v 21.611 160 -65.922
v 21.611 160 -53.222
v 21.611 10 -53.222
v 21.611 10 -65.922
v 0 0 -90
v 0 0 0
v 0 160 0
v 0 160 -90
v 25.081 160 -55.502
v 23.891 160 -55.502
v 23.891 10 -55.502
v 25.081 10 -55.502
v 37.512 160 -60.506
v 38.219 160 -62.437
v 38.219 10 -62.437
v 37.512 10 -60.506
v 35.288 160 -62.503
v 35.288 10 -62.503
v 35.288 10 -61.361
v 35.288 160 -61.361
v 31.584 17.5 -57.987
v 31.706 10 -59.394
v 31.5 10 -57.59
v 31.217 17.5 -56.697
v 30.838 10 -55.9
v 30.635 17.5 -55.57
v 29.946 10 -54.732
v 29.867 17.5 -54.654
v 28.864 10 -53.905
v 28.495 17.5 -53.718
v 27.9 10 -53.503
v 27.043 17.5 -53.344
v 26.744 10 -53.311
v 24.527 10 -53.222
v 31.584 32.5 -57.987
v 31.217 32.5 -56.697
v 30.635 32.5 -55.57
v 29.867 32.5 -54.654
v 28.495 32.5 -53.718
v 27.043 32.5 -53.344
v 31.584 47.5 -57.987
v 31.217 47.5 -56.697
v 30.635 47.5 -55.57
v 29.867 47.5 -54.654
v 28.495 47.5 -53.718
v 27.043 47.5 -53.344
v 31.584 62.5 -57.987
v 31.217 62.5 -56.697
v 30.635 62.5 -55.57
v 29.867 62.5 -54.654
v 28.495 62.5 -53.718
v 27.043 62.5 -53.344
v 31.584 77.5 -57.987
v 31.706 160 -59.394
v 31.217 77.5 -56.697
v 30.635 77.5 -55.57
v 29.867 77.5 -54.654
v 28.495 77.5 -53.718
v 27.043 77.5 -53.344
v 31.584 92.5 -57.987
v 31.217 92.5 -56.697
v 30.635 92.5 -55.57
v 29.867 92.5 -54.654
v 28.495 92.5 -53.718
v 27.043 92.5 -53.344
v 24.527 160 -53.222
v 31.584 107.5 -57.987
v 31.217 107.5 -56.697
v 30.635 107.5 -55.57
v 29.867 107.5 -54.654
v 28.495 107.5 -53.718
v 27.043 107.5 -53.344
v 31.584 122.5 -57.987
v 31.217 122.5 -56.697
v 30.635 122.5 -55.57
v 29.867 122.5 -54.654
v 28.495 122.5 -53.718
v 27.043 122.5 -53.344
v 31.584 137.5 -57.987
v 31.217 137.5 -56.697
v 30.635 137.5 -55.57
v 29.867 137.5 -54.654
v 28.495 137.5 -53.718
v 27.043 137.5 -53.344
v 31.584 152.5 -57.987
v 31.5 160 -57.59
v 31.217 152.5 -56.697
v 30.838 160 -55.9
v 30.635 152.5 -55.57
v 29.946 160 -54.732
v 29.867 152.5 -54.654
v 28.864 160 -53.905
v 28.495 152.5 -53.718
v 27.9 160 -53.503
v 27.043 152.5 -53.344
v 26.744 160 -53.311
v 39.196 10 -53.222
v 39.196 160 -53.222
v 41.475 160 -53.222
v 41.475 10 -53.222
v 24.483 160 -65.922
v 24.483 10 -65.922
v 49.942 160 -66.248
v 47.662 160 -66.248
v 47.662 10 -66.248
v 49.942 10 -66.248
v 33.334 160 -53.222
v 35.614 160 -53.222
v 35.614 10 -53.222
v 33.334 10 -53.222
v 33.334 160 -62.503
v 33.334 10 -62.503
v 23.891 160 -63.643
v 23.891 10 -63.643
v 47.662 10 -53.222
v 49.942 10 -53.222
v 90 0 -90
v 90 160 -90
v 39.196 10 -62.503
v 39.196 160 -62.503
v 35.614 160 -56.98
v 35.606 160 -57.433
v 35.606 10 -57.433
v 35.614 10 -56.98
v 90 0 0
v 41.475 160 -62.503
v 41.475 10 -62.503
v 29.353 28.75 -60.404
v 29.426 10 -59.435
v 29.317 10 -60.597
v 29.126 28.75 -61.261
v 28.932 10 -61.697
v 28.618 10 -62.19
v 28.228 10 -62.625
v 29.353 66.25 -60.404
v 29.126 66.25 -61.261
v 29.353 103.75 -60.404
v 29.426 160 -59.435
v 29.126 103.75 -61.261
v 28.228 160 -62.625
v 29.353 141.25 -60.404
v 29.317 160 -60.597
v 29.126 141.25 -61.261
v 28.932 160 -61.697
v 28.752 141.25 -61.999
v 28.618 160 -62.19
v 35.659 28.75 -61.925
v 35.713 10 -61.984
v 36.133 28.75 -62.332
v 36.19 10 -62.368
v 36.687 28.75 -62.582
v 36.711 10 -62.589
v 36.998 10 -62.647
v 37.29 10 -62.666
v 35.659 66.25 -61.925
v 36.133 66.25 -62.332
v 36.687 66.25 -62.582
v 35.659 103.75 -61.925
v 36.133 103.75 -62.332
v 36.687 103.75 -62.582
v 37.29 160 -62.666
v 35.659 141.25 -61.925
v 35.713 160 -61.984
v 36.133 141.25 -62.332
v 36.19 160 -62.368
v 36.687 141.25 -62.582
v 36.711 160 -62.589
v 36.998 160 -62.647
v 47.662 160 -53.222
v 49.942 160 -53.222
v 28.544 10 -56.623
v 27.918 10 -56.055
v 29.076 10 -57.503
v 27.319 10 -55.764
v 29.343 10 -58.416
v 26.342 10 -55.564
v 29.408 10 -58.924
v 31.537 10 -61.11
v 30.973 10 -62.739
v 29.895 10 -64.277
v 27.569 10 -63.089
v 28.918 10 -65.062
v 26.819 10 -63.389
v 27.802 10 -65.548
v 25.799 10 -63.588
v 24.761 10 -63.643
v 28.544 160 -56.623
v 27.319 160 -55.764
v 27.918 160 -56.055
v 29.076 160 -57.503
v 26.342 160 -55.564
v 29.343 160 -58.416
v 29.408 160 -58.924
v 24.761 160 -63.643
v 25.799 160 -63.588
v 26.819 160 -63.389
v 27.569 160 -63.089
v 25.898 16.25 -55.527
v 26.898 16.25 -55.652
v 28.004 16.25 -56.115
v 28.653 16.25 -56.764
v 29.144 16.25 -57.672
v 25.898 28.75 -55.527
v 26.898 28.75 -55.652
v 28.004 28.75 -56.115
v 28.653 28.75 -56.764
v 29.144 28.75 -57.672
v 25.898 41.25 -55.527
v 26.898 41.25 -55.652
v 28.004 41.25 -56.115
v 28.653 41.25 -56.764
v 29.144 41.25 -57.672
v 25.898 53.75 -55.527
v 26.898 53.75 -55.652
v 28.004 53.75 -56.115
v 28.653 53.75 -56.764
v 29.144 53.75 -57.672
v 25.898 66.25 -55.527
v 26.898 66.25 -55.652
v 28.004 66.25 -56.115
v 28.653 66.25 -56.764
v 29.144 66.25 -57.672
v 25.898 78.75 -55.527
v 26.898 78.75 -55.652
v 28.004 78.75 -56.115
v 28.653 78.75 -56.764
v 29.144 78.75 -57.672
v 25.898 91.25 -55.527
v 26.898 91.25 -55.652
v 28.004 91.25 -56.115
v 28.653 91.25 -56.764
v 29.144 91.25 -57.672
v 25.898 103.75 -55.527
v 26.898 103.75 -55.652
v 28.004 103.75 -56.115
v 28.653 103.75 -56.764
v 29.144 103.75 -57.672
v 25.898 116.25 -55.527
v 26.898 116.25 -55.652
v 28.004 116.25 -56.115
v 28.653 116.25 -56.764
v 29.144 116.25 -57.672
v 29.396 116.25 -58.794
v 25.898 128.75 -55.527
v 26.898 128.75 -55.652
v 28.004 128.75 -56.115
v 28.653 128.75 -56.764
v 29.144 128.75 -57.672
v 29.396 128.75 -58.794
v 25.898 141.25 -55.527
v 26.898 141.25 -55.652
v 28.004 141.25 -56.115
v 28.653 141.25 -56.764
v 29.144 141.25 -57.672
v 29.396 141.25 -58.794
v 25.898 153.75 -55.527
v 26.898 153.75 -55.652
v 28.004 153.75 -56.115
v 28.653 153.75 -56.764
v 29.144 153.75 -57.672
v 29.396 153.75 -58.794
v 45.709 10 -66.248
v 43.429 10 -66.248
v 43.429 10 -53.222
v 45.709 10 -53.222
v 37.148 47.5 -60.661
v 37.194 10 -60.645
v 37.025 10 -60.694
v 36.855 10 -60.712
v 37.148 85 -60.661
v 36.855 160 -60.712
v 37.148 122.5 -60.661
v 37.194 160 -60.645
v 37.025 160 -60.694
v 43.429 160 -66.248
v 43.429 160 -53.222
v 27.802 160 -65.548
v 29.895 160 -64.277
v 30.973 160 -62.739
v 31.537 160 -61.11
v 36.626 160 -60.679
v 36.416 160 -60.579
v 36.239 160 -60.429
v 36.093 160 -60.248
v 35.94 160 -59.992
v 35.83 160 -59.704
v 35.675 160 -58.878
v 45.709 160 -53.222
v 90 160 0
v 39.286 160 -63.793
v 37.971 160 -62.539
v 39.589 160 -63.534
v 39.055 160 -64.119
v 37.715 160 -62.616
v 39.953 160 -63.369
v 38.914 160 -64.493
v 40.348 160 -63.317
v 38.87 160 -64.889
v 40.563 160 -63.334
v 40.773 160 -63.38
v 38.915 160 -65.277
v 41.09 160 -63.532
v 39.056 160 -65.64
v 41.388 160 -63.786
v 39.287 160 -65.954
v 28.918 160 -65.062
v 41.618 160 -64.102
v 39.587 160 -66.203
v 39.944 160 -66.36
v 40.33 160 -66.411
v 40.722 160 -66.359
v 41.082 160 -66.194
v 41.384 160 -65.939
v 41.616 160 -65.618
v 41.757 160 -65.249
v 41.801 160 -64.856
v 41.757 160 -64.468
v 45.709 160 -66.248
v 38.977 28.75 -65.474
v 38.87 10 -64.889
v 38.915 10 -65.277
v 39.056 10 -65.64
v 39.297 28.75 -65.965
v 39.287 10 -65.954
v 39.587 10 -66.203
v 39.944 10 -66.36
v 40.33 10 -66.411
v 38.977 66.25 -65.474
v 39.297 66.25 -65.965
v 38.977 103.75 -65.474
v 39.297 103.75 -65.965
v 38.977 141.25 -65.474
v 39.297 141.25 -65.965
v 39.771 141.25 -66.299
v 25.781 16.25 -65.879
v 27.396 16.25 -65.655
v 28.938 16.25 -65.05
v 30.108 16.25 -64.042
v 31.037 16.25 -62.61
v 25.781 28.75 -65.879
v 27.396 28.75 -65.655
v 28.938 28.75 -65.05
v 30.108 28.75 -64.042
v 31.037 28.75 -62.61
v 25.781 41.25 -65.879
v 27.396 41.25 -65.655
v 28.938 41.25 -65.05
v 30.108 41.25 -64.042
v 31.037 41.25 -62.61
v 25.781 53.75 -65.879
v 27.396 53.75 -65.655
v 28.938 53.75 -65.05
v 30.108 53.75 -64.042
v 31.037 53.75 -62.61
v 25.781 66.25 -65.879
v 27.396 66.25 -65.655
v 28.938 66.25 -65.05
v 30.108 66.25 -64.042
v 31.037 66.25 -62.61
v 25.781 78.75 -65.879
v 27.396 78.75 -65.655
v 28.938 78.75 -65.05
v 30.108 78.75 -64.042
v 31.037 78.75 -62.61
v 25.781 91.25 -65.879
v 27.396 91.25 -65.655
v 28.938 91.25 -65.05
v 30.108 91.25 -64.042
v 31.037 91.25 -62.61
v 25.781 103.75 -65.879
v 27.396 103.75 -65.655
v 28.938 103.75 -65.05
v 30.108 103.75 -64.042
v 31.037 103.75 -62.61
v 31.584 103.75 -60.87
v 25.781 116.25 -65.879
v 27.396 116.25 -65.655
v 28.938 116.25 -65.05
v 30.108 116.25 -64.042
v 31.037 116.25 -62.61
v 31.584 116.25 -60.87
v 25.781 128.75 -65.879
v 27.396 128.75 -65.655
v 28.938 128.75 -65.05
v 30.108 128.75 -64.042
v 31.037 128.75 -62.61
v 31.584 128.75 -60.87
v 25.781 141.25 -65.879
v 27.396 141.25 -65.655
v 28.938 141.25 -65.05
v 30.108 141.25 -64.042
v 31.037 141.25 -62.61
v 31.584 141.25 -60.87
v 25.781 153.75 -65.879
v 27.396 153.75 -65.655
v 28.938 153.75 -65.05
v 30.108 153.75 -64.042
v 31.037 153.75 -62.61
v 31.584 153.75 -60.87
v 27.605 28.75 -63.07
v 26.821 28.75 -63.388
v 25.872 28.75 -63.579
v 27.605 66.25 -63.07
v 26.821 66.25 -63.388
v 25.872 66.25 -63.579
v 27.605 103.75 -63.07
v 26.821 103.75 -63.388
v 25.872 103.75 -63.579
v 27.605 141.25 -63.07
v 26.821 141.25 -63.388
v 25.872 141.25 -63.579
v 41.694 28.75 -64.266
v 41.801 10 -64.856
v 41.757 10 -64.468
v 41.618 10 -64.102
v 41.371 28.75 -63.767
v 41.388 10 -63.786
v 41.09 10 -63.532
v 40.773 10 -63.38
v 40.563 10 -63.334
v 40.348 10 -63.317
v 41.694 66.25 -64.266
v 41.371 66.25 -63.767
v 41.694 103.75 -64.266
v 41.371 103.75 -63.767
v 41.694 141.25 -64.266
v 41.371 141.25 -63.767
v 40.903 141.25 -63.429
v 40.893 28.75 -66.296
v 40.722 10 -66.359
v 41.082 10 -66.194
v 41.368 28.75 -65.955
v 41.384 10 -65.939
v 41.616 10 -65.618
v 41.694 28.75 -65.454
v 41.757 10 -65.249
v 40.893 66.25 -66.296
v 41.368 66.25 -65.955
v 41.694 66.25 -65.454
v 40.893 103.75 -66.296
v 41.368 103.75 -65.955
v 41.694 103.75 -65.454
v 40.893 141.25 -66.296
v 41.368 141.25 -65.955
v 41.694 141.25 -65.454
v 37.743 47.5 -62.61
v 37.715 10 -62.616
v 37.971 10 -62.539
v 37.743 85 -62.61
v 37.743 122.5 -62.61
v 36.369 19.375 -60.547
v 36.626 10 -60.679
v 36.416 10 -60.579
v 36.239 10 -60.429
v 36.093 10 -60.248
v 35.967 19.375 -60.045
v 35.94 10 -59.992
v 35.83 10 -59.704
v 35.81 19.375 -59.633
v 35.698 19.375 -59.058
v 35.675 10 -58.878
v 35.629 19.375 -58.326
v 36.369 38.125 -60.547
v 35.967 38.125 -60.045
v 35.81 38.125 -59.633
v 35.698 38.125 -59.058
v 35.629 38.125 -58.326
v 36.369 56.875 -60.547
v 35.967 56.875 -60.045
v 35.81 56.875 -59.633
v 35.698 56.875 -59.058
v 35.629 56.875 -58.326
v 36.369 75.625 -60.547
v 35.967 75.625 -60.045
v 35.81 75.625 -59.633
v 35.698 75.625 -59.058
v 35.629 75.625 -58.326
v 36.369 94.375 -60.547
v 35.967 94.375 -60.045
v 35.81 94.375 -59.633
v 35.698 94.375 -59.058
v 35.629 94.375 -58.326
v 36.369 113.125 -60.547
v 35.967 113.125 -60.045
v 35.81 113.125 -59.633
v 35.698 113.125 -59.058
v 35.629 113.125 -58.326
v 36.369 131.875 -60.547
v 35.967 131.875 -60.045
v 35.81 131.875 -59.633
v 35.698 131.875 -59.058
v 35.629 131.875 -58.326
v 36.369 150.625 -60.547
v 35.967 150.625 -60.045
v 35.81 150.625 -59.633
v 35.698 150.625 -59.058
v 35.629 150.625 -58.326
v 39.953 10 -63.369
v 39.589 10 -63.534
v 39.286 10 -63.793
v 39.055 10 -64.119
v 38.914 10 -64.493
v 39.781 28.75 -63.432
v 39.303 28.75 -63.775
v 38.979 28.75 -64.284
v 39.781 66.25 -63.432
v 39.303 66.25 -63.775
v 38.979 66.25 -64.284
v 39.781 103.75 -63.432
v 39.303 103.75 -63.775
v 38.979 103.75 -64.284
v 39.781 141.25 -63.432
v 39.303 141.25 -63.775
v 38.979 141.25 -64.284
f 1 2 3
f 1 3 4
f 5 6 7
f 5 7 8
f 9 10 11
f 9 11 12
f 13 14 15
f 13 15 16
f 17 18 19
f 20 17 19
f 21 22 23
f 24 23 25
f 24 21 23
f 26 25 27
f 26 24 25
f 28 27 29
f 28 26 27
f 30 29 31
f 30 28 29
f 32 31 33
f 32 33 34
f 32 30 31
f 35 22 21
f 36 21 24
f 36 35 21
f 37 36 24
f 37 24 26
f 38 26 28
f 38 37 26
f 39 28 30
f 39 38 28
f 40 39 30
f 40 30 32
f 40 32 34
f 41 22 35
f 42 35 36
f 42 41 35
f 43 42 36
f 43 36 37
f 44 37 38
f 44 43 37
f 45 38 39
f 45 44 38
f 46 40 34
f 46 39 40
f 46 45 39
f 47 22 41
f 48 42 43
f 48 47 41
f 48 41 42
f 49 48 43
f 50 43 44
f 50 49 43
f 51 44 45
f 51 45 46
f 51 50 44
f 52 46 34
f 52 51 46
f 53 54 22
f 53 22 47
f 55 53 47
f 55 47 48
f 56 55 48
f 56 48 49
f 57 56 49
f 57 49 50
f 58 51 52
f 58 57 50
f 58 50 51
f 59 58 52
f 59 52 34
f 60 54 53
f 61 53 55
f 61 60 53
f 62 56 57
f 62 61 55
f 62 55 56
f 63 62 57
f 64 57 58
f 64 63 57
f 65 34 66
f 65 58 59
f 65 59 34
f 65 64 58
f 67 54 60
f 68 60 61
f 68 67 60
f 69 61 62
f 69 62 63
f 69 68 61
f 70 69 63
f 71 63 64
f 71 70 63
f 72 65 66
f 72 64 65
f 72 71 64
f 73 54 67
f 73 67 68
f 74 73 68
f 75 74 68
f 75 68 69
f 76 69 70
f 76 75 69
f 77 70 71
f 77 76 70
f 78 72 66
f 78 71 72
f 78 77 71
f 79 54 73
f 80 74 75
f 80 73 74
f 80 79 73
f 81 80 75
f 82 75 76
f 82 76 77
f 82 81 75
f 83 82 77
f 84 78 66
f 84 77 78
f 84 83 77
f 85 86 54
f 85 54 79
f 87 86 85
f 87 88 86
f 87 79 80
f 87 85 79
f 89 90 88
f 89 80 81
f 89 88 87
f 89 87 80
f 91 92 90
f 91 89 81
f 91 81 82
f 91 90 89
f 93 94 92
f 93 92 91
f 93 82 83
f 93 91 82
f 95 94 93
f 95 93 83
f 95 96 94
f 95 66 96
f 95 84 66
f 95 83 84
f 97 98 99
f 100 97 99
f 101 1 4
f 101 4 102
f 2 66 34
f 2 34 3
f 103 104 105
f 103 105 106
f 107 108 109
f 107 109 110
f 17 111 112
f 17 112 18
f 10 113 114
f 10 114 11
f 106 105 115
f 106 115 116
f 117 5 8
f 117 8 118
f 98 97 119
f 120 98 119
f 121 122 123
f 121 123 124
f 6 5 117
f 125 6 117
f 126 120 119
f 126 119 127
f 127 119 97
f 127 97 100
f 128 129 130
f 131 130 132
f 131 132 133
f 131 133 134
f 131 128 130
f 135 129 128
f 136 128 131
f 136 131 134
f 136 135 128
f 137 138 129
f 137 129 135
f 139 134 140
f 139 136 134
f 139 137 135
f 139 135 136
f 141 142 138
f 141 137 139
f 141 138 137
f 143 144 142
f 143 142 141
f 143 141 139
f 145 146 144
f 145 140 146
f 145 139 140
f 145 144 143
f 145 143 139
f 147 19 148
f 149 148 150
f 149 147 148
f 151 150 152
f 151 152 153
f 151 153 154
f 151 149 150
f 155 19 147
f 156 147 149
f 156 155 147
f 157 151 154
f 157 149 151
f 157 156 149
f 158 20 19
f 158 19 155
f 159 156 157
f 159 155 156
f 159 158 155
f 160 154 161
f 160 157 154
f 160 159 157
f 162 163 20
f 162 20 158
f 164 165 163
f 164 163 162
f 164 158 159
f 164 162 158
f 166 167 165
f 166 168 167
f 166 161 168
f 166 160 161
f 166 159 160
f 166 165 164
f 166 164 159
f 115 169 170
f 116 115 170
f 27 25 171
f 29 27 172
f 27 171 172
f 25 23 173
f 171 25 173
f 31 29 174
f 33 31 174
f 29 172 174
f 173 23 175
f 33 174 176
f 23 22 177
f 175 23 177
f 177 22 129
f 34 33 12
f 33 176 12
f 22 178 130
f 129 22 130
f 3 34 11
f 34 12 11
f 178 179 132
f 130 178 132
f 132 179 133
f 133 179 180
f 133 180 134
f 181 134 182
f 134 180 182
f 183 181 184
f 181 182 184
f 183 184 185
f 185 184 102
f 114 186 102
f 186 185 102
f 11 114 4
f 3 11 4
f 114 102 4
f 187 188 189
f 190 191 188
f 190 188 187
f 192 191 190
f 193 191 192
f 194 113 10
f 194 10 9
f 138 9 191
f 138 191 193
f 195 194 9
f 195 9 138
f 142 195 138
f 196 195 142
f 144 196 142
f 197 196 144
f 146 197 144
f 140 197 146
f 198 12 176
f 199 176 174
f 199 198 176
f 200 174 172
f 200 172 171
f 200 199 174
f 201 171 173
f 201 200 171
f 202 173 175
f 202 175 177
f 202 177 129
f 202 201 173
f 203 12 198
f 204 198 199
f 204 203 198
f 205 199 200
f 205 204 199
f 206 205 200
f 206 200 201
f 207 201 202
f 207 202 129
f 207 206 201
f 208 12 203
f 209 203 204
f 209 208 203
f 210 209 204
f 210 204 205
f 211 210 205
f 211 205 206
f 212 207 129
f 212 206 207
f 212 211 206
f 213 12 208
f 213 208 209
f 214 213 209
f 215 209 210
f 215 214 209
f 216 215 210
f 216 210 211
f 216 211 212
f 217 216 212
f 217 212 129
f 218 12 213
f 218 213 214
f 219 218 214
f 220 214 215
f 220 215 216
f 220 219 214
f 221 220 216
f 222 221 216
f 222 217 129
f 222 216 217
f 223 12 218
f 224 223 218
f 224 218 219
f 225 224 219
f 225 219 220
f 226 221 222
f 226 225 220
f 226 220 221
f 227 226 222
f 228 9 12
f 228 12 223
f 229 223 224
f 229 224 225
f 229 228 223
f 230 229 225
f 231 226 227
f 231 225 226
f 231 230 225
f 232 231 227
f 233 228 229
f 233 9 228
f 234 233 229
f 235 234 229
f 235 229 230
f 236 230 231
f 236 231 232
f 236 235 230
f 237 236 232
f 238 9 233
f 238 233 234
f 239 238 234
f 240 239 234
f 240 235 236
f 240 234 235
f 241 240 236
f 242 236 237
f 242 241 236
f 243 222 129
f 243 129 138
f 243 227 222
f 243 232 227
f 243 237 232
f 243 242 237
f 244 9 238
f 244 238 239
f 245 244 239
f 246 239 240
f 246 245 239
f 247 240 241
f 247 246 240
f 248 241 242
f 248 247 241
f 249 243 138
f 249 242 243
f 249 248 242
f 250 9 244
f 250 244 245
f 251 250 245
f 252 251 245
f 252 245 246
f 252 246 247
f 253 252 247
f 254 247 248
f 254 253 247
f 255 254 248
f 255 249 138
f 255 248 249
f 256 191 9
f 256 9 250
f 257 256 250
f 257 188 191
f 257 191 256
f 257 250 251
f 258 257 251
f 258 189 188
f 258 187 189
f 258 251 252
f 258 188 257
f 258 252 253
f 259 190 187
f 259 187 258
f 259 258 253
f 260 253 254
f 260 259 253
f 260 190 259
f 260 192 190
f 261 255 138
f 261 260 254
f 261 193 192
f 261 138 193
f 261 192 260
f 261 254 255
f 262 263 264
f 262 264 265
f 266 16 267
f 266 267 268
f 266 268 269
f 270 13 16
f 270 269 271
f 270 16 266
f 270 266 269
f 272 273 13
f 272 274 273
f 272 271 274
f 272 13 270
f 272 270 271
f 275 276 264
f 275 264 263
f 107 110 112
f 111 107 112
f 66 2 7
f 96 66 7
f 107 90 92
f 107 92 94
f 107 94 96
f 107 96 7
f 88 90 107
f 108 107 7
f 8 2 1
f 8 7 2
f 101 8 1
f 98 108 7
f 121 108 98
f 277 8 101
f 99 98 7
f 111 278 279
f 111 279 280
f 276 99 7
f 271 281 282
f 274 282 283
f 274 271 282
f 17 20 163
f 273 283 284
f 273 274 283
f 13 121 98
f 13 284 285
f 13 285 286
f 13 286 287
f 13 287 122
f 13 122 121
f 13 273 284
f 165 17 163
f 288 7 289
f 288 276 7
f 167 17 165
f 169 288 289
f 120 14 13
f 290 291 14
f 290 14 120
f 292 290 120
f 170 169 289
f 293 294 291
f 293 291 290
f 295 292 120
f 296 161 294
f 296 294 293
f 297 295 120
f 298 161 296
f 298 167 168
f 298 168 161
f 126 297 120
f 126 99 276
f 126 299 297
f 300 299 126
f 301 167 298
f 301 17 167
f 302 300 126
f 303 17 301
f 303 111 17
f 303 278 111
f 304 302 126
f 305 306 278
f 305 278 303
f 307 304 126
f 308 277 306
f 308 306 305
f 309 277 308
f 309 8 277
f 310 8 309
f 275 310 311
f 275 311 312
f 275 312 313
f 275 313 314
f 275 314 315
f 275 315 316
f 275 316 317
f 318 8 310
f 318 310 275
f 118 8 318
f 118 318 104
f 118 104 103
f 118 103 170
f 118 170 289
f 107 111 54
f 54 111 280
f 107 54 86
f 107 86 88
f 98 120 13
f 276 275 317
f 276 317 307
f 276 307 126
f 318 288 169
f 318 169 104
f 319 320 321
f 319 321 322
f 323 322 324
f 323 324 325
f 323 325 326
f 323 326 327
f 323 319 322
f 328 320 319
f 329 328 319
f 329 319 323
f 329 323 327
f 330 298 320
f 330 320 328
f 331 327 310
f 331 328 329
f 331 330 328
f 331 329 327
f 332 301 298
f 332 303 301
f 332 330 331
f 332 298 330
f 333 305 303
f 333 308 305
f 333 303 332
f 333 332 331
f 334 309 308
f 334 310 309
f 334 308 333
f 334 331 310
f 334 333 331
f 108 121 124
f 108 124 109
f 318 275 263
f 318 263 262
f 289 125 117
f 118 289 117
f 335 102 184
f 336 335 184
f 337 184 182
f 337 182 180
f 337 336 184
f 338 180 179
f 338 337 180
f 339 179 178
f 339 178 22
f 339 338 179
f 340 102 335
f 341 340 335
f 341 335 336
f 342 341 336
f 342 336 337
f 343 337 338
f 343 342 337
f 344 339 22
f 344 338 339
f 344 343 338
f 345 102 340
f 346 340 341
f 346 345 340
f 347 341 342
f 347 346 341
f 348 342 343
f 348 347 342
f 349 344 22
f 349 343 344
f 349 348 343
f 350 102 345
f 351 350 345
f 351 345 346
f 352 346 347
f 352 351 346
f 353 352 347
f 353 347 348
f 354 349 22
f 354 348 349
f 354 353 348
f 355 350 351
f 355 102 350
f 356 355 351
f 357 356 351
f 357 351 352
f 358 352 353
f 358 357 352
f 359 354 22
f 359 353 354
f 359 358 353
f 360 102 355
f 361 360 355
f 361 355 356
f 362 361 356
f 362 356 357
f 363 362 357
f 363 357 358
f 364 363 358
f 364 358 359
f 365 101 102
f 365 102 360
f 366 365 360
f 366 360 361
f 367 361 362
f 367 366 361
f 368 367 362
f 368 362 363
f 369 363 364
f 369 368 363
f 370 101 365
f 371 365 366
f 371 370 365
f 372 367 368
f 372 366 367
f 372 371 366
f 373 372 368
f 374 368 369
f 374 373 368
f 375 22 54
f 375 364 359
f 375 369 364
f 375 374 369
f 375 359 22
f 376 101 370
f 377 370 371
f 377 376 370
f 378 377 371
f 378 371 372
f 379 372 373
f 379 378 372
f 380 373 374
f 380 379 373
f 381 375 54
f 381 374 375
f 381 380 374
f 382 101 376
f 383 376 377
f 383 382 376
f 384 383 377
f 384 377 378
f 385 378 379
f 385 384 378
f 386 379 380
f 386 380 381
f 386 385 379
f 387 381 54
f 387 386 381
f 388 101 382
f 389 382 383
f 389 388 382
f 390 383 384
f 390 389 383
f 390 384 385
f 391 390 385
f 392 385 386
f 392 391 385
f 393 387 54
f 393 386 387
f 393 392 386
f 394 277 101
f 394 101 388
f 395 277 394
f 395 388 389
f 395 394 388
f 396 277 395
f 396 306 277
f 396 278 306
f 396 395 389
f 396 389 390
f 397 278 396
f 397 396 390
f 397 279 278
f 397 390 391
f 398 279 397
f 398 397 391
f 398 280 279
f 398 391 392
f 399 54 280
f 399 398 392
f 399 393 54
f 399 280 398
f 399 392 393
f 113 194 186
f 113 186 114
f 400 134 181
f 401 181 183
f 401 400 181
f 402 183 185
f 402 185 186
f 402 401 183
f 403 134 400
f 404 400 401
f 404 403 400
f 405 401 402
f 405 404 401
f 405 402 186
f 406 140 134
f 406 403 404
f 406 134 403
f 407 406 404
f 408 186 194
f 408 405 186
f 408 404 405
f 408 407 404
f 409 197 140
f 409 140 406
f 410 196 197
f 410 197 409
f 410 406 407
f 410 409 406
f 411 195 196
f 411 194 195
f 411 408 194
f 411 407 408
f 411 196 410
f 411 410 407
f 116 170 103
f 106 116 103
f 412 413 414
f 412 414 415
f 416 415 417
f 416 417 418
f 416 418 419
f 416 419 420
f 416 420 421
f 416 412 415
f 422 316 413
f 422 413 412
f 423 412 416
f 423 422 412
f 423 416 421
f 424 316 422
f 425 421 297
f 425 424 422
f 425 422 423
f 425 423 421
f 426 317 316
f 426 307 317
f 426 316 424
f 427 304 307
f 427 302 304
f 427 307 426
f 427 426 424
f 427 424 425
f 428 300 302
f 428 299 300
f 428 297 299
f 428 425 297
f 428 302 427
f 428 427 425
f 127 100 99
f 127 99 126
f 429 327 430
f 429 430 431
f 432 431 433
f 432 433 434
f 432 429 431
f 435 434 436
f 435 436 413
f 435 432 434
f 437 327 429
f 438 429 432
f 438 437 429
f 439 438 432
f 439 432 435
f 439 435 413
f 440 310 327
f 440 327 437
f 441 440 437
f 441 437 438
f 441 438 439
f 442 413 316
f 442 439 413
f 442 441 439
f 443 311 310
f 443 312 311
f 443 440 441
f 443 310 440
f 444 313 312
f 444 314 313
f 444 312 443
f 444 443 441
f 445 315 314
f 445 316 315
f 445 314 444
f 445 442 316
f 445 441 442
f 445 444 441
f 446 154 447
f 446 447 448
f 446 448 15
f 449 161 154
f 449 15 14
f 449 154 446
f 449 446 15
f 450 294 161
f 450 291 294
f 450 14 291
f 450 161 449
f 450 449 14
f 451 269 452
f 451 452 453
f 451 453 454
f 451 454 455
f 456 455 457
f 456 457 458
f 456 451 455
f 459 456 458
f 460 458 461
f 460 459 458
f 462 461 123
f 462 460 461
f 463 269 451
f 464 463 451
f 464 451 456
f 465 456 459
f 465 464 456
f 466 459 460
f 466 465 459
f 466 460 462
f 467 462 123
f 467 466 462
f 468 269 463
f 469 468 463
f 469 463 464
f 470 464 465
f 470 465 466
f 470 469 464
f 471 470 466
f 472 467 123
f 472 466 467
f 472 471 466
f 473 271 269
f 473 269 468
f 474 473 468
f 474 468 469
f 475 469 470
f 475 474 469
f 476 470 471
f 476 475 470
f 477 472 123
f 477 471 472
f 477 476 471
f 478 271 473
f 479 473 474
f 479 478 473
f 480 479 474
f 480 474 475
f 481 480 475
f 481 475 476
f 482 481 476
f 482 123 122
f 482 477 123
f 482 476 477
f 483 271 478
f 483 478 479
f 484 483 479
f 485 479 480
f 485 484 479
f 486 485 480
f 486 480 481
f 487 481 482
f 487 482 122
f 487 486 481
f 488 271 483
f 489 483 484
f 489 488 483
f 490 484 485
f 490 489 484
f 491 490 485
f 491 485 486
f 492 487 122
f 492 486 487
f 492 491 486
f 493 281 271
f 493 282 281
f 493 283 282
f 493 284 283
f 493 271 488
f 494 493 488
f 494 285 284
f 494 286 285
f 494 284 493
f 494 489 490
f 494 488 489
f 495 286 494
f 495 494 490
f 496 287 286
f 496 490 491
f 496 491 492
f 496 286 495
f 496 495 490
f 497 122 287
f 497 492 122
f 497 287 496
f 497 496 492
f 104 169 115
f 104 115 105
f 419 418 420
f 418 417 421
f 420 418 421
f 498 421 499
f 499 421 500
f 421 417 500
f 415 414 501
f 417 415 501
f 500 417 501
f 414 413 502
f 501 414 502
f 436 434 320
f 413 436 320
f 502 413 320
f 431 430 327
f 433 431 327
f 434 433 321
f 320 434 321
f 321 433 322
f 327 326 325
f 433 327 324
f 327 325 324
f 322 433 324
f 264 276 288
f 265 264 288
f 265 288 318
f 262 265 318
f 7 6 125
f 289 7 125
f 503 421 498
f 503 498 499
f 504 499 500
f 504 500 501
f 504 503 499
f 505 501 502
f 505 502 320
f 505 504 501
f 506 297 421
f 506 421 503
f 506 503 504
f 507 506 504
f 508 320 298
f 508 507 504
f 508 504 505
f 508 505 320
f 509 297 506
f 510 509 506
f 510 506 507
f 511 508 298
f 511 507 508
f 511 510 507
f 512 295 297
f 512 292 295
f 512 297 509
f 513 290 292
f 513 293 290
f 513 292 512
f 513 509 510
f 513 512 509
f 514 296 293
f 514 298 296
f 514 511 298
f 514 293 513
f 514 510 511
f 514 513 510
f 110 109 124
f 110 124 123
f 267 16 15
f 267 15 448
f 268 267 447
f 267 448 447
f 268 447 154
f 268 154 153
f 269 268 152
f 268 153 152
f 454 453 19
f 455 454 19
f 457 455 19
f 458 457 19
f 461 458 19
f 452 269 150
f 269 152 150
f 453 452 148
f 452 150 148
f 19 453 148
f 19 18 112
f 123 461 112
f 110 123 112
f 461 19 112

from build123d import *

# Parameters (mm, degrees)
SKETCH1_W           = 90
SKETCH1_H           = 90
BOSS_EXTRUDE1_DEPTH = 160
SKETCH2_W           = 2.27948718
SKETCH2_H           = 9.280769231
SKETCH2_W_2         = 2.279487179
SKETCH2_H_2         = 13.025641026
CUT_EXTRUDE1_DEPTH  = 150


with BuildPart() as part:
    # Sketch1 → Boss-Extrude1 (new body)
    with BuildSketch(Plane(origin=(0, 0, 0), x_dir=(1, 0, 0), z_dir=(0, 1, 0))):
        with Locations((45, 45)):
            Rectangle(SKETCH1_W, SKETCH1_H)
    extrude(amount=BOSS_EXTRUDE1_DEPTH)

    # Sketch2 → Cut-Extrude1 (cut)
    with BuildSketch(Plane(origin=(0, 160, 0), x_dir=(1, 0, 0), z_dir=(0, 1, 0))):
        with BuildLine():
            Line((21.611077672, 65.922158503), (24.483333281, 65.922158503))
            add(Edge.make_bspline(
                [(24.483333281, 65.922158503), (24.707258642, 65.920593189), (25.140108898, 65.917567417), (25.767223285, 65.88347425), (26.350359864, 65.831041379), (26.889894536, 65.758910462), (27.384721167, 65.663461507), (27.834201687, 65.543739501), (28.239844663, 65.405540361), (28.606097885, 65.242921031), (28.940451848, 65.053323041), (29.257931608, 64.842126103), (29.557913799, 64.601593454), (29.844608198, 64.336365449), (30.114314952, 64.041589823), (30.371525645, 63.722149129), (30.609942592, 63.373411035), (30.836772622, 63.003737182), (31.0419102, 62.611560926), (31.220838862, 62.200220391), (31.370728486, 61.772362706), (31.492521568, 61.327531886), (31.589604711, 60.867204634), (31.657531829, 60.390452053), (31.69952505, 59.897715535), (31.703784912, 59.563763804), (31.705949466, 59.394073568)],
                knots=[0, 0, 0, 0, 1.44355588, 2.790409838, 4.047694926, 5.217575253, 6.298404546, 7.294384826, 8.214239204, 9.058592145, 9.873746385, 10.689560431, 11.514393297, 12.350027578, 13.205127629, 14.088021785, 14.991911688, 15.926770944, 16.882954281, 17.842803888, 18.816321264, 19.80318086, 20.814351908, 21.847355356, 22.906180909, 24, 24, 24, 24], degree=3))
            add(Edge.make_bspline(
                [(31.705949466, 59.394073568), (31.700281493, 59.154629598), (31.689123756, 58.683270128), (31.595137212, 57.991555537), (31.443129146, 57.328478111), (31.229391999, 56.699224698), (30.964415152, 56.109398894), (30.647870638, 55.569402028), (30.284399734, 55.082132531), (29.8782369, 54.650016606), (29.438461471, 54.278607111), (28.981446119, 53.960522058), (28.502738681, 53.709685452), (28.080930527, 53.550617534), (27.715170235, 53.451691051), (27.394036655, 53.393224547), (27.029261674, 53.339607236), (26.617444083, 53.298172932), (26.160390436, 53.261223715), (25.656278912, 53.241146949), (25.106741679, 53.224466136), (24.725036111, 53.22294787), (24.526582479, 53.222158503)],
                knots=[0, 0, 0, 0, 1.315458931, 2.589557908, 3.828601765, 5.048913369, 6.235739168, 7.376350998, 8.481830359, 9.569842114, 10.627874879, 11.640079404, 12.624025415, 13.590060155, 14.111227486, 14.704434459, 15.382649715, 16.137166398, 16.978595427, 17.902333227, 18.909396075, 20, 20, 20, 20], degree=3))
            Line((24.526582479, 53.222158503), (21.611077672, 53.222158503))
            Line((21.611077672, 53.222158503), (21.611077672, 65.922158503))
        make_face()
        with BuildLine():
            Line((23.890564851, 63.642671324), (23.890564851, 55.501645683))
            Line((23.890564851, 55.501645683), (25.081189851, 55.501645683))
            add(Edge.make_bspline(
                [(25.081189851, 55.501645683), (25.222855941, 55.501905274), (25.495326993, 55.502404554), (25.888713514, 55.52618568), (26.252496301, 55.550055373), (26.585673943, 55.595360849), (26.890671205, 55.645827961), (27.163298221, 55.716059857), (27.409175021, 55.789832515), (27.625298266, 55.883754252), (27.823249549, 55.989469418), (28.006529826, 56.11332699), (28.183446608, 56.250866153), (28.350692293, 56.406132129), (28.508899865, 56.577068904), (28.657133269, 56.764557241), (28.797371028, 56.968025107), (28.926013504, 57.188548286), (29.043567688, 57.423798005), (29.147851421, 57.671495526), (29.234318024, 57.933703637), (29.306183771, 58.207967754), (29.357539996, 58.496675658), (29.400027477, 58.797688929), (29.421931011, 59.112200156), (29.424937135, 59.326204107), (29.426462287, 59.434778696)],
                knots=[0, 0, 0, 0, 1.50275155, 2.890291501, 4.180787663, 5.369391935, 6.45668281, 7.458360028, 8.354766181, 9.177074746, 9.954075863, 10.732690366, 11.5210699, 12.329727389, 13.151100085, 13.990027547, 14.863562427, 15.770965086, 16.696477834, 17.652329173, 18.619756807, 19.62365428, 20.657822005, 21.729286259, 22.847956731, 24, 24, 24, 24], degree=3))
            add(Edge.make_bspline(
                [(29.426462287, 59.434778696), (29.423424701, 59.601158989), (29.417501644, 59.92558767), (29.360380967, 60.398125124), (29.267399399, 60.843089927), (29.134723662, 61.258830694), (28.967481782, 61.646515876), (28.758139585, 62.002860957), (28.515706351, 62.333852044), (28.323996765, 62.528022037), (28.228205075, 62.625043119)],
                knots=[0, 0, 0, 0, 1.13821349, 2.219428113, 3.251817212, 4.244760574, 5.201143372, 6.134805572, 7.068016741, 8, 8, 8, 8], degree=3))
            add(Edge.make_bspline(
                [(28.228205075, 62.625043119), (28.133745399, 62.707718197), (27.940822207, 62.876572683), (27.602112479, 63.078903538), (27.228871901, 63.256671027), (26.812561848, 63.39762082), (26.357205771, 63.509089926), (25.86009156, 63.585967442), (25.32388137, 63.635368119), (24.952407444, 63.640184767), (24.760636966, 63.642671324)],
                knots=[0, 0, 0, 0, 0.813307809, 1.661089106, 2.549956539, 3.493439533, 4.508053171, 5.589449661, 6.755572447, 8, 8, 8, 8], degree=3))
            Line((24.760636966, 63.642671324), (23.890564851, 63.642671324))
        make_face(mode=Mode.SUBTRACT)
        with BuildLine():
            Line((33.334154595, 62.502927734), (35.288000749, 62.502927734))
            Line((35.288000749, 62.502927734), (35.288000749, 61.360640074))
            add(Edge.make_bspline(
                [(35.288000749, 61.360640074), (35.343271305, 61.462155493), (35.451299902, 61.66057159), (35.649757493, 61.926905908), (35.877753612, 62.151205239), (36.127095654, 62.338161009), (36.398539324, 62.483874674), (36.684815845, 62.587714031), (36.983476127, 62.655195223), (37.187212046, 62.662205243), (37.290184242, 62.665748247)],
                knots=[0, 0, 0, 0, 1.09866127, 2.147379032, 3.14564304, 4.131443017, 5.102343063, 6.064490016, 7.021754664, 8, 8, 8, 8], degree=3))
            add(Edge.make_bspline(
                [(37.290184242, 62.665748247), (37.364954905, 62.662247019), (37.517214674, 62.655117269), (37.749279987, 62.613671922), (37.984693596, 62.538730853), (38.139616036, 62.471256381), (38.218769979, 62.436781901)],
                knots=[0, 0, 0, 0, 0.931404136, 1.896671404, 2.925354185, 4, 4, 4, 4], degree=3))
            Line((38.218769979, 62.436781901), (37.511518377, 60.505832382))
            add(Edge.make_bspline(
                [(37.511518377, 60.505832382), (37.448300183, 60.536376356), (37.329474315, 60.593787271), (37.156959787, 60.661538064), (37.000395699, 60.702876287), (36.901136942, 60.709044312), (36.855148184, 60.711902093)],
                knots=[0, 0, 0, 0, 1.214386998, 2.282580073, 3.20428172, 4, 4, 4, 4], degree=3))
            add(Edge.make_bspline(
                [(36.855148184, 60.711902093), (36.811725854, 60.710008376), (36.726306649, 60.706283109), (36.600230293, 60.674358835), (36.481492619, 60.619306412), (36.364371666, 60.548778795), (36.258106978, 60.450740133), (36.151907928, 60.337242974), (36.058319638, 60.197115636), (35.959556851, 60.041146791), (35.875463869, 59.850241066), (35.803356726, 59.622338971), (35.739108683, 59.354803523), (35.694897257, 59.046214239), (35.65216514, 58.699557253), (35.626729934, 58.312288146), (35.607772753, 57.8856315), (35.606613649, 57.587809763), (35.606009563, 57.432595202)],
                knots=[0, 0, 0, 0, 0.544232178, 1.070598461, 1.618251235, 2.182094276, 2.777567932, 3.425210017, 4.127676488, 4.886675562, 5.738955394, 6.734782583, 7.883056018, 9.186093582, 10.642914445, 12.264202625, 14.053029461, 16, 16, 16, 16], degree=3))
            Line((35.606009563, 57.432595202), (35.613641774, 56.979750651))
            Line((35.613641774, 56.979750651), (35.613641774, 53.222158503))
            Line((35.613641774, 53.222158503), (33.334154595, 53.222158503))
            Line((33.334154595, 53.222158503), (33.334154595, 62.502927734))
        make_face()
        with BuildLine():
            add(Edge.make_bspline(
                [(40.330348505, 66.410620042), (40.428594386, 66.405799727), (40.62150964, 66.396334575), (40.897886993, 66.304070393), (41.151545391, 66.159264517), (41.375786449, 65.960587403), (41.562289193, 65.723330591), (41.704784215, 65.457705815), (41.784162256, 65.163402119), (41.795186692, 64.960100203), (41.800821261, 64.856192959)],
                knots=[0, 0, 0, 0, 0.989868614, 1.943702388, 2.910836514, 3.924849579, 4.949916355, 5.946401046, 6.950409252, 8, 8, 8, 8], degree=3))
            add(Edge.make_bspline(
                [(41.800821261, 64.856192959), (41.795388287, 64.753051453), (41.784801879, 64.552075317), (41.702957281, 64.261766931), (41.566181513, 63.996271169), (41.378168214, 63.762538061), (41.156358222, 63.56706076), (40.908242454, 63.41962602), (40.634513598, 63.332494474), (40.444591807, 63.322238088), (40.348156999, 63.317030298)],
                knots=[0, 0, 0, 0, 1.05296456, 2.051751585, 3.055639087, 4.085634717, 5.099016424, 6.062201612, 7.016062274, 8, 8, 8, 8], degree=3))
            add(Edge.make_bspline(
                [(40.348156999, 63.317030298), (40.249053512, 63.321833381), (40.054459903, 63.331264425), (39.775815687, 63.423744483), (39.518774135, 63.567409919), (39.295505833, 63.770146314), (39.106867216, 64.009089016), (38.970596432, 64.280897766), (38.885355686, 64.577213904), (38.875237684, 64.783526859), (38.870052031, 64.889265875)],
                knots=[0, 0, 0, 0, 0.989065327, 1.942068821, 2.907541208, 3.917690034, 4.939857478, 5.938239964, 6.943311734, 8, 8, 8, 8], degree=3))
            add(Edge.make_bspline(
                [(38.870052031, 64.889265875), (38.87569544, 64.990655977), (38.886781102, 65.189822194), (38.966634626, 65.477582657), (39.105862243, 65.738741864), (39.291021589, 65.971655469), (39.513293056, 66.166626507), (39.766799179, 66.307034534), (40.041316502, 66.395487942), (40.233009707, 66.405523927), (40.330348505, 66.410620042)],
                knots=[0, 0, 0, 0, 1.038616768, 2.040212704, 3.031499824, 4.052181184, 5.074969369, 6.039807101, 7.004644834, 8, 8, 8, 8], degree=3))
        make_face()
        with Locations((40.335436646, 57.862543118)):
            Rectangle(SKETCH2_W, SKETCH2_H)
        with Locations((44.56876998, 59.734979016)):
            Rectangle(SKETCH2_W_2, SKETCH2_H_2)
        with Locations((48.802103313, 59.734979016)):
            Rectangle(SKETCH2_W_2, SKETCH2_H_2)
    extrude(amount=-CUT_EXTRUDE1_DEPTH, mode=Mode.SUBTRACT)


solid = part.part
